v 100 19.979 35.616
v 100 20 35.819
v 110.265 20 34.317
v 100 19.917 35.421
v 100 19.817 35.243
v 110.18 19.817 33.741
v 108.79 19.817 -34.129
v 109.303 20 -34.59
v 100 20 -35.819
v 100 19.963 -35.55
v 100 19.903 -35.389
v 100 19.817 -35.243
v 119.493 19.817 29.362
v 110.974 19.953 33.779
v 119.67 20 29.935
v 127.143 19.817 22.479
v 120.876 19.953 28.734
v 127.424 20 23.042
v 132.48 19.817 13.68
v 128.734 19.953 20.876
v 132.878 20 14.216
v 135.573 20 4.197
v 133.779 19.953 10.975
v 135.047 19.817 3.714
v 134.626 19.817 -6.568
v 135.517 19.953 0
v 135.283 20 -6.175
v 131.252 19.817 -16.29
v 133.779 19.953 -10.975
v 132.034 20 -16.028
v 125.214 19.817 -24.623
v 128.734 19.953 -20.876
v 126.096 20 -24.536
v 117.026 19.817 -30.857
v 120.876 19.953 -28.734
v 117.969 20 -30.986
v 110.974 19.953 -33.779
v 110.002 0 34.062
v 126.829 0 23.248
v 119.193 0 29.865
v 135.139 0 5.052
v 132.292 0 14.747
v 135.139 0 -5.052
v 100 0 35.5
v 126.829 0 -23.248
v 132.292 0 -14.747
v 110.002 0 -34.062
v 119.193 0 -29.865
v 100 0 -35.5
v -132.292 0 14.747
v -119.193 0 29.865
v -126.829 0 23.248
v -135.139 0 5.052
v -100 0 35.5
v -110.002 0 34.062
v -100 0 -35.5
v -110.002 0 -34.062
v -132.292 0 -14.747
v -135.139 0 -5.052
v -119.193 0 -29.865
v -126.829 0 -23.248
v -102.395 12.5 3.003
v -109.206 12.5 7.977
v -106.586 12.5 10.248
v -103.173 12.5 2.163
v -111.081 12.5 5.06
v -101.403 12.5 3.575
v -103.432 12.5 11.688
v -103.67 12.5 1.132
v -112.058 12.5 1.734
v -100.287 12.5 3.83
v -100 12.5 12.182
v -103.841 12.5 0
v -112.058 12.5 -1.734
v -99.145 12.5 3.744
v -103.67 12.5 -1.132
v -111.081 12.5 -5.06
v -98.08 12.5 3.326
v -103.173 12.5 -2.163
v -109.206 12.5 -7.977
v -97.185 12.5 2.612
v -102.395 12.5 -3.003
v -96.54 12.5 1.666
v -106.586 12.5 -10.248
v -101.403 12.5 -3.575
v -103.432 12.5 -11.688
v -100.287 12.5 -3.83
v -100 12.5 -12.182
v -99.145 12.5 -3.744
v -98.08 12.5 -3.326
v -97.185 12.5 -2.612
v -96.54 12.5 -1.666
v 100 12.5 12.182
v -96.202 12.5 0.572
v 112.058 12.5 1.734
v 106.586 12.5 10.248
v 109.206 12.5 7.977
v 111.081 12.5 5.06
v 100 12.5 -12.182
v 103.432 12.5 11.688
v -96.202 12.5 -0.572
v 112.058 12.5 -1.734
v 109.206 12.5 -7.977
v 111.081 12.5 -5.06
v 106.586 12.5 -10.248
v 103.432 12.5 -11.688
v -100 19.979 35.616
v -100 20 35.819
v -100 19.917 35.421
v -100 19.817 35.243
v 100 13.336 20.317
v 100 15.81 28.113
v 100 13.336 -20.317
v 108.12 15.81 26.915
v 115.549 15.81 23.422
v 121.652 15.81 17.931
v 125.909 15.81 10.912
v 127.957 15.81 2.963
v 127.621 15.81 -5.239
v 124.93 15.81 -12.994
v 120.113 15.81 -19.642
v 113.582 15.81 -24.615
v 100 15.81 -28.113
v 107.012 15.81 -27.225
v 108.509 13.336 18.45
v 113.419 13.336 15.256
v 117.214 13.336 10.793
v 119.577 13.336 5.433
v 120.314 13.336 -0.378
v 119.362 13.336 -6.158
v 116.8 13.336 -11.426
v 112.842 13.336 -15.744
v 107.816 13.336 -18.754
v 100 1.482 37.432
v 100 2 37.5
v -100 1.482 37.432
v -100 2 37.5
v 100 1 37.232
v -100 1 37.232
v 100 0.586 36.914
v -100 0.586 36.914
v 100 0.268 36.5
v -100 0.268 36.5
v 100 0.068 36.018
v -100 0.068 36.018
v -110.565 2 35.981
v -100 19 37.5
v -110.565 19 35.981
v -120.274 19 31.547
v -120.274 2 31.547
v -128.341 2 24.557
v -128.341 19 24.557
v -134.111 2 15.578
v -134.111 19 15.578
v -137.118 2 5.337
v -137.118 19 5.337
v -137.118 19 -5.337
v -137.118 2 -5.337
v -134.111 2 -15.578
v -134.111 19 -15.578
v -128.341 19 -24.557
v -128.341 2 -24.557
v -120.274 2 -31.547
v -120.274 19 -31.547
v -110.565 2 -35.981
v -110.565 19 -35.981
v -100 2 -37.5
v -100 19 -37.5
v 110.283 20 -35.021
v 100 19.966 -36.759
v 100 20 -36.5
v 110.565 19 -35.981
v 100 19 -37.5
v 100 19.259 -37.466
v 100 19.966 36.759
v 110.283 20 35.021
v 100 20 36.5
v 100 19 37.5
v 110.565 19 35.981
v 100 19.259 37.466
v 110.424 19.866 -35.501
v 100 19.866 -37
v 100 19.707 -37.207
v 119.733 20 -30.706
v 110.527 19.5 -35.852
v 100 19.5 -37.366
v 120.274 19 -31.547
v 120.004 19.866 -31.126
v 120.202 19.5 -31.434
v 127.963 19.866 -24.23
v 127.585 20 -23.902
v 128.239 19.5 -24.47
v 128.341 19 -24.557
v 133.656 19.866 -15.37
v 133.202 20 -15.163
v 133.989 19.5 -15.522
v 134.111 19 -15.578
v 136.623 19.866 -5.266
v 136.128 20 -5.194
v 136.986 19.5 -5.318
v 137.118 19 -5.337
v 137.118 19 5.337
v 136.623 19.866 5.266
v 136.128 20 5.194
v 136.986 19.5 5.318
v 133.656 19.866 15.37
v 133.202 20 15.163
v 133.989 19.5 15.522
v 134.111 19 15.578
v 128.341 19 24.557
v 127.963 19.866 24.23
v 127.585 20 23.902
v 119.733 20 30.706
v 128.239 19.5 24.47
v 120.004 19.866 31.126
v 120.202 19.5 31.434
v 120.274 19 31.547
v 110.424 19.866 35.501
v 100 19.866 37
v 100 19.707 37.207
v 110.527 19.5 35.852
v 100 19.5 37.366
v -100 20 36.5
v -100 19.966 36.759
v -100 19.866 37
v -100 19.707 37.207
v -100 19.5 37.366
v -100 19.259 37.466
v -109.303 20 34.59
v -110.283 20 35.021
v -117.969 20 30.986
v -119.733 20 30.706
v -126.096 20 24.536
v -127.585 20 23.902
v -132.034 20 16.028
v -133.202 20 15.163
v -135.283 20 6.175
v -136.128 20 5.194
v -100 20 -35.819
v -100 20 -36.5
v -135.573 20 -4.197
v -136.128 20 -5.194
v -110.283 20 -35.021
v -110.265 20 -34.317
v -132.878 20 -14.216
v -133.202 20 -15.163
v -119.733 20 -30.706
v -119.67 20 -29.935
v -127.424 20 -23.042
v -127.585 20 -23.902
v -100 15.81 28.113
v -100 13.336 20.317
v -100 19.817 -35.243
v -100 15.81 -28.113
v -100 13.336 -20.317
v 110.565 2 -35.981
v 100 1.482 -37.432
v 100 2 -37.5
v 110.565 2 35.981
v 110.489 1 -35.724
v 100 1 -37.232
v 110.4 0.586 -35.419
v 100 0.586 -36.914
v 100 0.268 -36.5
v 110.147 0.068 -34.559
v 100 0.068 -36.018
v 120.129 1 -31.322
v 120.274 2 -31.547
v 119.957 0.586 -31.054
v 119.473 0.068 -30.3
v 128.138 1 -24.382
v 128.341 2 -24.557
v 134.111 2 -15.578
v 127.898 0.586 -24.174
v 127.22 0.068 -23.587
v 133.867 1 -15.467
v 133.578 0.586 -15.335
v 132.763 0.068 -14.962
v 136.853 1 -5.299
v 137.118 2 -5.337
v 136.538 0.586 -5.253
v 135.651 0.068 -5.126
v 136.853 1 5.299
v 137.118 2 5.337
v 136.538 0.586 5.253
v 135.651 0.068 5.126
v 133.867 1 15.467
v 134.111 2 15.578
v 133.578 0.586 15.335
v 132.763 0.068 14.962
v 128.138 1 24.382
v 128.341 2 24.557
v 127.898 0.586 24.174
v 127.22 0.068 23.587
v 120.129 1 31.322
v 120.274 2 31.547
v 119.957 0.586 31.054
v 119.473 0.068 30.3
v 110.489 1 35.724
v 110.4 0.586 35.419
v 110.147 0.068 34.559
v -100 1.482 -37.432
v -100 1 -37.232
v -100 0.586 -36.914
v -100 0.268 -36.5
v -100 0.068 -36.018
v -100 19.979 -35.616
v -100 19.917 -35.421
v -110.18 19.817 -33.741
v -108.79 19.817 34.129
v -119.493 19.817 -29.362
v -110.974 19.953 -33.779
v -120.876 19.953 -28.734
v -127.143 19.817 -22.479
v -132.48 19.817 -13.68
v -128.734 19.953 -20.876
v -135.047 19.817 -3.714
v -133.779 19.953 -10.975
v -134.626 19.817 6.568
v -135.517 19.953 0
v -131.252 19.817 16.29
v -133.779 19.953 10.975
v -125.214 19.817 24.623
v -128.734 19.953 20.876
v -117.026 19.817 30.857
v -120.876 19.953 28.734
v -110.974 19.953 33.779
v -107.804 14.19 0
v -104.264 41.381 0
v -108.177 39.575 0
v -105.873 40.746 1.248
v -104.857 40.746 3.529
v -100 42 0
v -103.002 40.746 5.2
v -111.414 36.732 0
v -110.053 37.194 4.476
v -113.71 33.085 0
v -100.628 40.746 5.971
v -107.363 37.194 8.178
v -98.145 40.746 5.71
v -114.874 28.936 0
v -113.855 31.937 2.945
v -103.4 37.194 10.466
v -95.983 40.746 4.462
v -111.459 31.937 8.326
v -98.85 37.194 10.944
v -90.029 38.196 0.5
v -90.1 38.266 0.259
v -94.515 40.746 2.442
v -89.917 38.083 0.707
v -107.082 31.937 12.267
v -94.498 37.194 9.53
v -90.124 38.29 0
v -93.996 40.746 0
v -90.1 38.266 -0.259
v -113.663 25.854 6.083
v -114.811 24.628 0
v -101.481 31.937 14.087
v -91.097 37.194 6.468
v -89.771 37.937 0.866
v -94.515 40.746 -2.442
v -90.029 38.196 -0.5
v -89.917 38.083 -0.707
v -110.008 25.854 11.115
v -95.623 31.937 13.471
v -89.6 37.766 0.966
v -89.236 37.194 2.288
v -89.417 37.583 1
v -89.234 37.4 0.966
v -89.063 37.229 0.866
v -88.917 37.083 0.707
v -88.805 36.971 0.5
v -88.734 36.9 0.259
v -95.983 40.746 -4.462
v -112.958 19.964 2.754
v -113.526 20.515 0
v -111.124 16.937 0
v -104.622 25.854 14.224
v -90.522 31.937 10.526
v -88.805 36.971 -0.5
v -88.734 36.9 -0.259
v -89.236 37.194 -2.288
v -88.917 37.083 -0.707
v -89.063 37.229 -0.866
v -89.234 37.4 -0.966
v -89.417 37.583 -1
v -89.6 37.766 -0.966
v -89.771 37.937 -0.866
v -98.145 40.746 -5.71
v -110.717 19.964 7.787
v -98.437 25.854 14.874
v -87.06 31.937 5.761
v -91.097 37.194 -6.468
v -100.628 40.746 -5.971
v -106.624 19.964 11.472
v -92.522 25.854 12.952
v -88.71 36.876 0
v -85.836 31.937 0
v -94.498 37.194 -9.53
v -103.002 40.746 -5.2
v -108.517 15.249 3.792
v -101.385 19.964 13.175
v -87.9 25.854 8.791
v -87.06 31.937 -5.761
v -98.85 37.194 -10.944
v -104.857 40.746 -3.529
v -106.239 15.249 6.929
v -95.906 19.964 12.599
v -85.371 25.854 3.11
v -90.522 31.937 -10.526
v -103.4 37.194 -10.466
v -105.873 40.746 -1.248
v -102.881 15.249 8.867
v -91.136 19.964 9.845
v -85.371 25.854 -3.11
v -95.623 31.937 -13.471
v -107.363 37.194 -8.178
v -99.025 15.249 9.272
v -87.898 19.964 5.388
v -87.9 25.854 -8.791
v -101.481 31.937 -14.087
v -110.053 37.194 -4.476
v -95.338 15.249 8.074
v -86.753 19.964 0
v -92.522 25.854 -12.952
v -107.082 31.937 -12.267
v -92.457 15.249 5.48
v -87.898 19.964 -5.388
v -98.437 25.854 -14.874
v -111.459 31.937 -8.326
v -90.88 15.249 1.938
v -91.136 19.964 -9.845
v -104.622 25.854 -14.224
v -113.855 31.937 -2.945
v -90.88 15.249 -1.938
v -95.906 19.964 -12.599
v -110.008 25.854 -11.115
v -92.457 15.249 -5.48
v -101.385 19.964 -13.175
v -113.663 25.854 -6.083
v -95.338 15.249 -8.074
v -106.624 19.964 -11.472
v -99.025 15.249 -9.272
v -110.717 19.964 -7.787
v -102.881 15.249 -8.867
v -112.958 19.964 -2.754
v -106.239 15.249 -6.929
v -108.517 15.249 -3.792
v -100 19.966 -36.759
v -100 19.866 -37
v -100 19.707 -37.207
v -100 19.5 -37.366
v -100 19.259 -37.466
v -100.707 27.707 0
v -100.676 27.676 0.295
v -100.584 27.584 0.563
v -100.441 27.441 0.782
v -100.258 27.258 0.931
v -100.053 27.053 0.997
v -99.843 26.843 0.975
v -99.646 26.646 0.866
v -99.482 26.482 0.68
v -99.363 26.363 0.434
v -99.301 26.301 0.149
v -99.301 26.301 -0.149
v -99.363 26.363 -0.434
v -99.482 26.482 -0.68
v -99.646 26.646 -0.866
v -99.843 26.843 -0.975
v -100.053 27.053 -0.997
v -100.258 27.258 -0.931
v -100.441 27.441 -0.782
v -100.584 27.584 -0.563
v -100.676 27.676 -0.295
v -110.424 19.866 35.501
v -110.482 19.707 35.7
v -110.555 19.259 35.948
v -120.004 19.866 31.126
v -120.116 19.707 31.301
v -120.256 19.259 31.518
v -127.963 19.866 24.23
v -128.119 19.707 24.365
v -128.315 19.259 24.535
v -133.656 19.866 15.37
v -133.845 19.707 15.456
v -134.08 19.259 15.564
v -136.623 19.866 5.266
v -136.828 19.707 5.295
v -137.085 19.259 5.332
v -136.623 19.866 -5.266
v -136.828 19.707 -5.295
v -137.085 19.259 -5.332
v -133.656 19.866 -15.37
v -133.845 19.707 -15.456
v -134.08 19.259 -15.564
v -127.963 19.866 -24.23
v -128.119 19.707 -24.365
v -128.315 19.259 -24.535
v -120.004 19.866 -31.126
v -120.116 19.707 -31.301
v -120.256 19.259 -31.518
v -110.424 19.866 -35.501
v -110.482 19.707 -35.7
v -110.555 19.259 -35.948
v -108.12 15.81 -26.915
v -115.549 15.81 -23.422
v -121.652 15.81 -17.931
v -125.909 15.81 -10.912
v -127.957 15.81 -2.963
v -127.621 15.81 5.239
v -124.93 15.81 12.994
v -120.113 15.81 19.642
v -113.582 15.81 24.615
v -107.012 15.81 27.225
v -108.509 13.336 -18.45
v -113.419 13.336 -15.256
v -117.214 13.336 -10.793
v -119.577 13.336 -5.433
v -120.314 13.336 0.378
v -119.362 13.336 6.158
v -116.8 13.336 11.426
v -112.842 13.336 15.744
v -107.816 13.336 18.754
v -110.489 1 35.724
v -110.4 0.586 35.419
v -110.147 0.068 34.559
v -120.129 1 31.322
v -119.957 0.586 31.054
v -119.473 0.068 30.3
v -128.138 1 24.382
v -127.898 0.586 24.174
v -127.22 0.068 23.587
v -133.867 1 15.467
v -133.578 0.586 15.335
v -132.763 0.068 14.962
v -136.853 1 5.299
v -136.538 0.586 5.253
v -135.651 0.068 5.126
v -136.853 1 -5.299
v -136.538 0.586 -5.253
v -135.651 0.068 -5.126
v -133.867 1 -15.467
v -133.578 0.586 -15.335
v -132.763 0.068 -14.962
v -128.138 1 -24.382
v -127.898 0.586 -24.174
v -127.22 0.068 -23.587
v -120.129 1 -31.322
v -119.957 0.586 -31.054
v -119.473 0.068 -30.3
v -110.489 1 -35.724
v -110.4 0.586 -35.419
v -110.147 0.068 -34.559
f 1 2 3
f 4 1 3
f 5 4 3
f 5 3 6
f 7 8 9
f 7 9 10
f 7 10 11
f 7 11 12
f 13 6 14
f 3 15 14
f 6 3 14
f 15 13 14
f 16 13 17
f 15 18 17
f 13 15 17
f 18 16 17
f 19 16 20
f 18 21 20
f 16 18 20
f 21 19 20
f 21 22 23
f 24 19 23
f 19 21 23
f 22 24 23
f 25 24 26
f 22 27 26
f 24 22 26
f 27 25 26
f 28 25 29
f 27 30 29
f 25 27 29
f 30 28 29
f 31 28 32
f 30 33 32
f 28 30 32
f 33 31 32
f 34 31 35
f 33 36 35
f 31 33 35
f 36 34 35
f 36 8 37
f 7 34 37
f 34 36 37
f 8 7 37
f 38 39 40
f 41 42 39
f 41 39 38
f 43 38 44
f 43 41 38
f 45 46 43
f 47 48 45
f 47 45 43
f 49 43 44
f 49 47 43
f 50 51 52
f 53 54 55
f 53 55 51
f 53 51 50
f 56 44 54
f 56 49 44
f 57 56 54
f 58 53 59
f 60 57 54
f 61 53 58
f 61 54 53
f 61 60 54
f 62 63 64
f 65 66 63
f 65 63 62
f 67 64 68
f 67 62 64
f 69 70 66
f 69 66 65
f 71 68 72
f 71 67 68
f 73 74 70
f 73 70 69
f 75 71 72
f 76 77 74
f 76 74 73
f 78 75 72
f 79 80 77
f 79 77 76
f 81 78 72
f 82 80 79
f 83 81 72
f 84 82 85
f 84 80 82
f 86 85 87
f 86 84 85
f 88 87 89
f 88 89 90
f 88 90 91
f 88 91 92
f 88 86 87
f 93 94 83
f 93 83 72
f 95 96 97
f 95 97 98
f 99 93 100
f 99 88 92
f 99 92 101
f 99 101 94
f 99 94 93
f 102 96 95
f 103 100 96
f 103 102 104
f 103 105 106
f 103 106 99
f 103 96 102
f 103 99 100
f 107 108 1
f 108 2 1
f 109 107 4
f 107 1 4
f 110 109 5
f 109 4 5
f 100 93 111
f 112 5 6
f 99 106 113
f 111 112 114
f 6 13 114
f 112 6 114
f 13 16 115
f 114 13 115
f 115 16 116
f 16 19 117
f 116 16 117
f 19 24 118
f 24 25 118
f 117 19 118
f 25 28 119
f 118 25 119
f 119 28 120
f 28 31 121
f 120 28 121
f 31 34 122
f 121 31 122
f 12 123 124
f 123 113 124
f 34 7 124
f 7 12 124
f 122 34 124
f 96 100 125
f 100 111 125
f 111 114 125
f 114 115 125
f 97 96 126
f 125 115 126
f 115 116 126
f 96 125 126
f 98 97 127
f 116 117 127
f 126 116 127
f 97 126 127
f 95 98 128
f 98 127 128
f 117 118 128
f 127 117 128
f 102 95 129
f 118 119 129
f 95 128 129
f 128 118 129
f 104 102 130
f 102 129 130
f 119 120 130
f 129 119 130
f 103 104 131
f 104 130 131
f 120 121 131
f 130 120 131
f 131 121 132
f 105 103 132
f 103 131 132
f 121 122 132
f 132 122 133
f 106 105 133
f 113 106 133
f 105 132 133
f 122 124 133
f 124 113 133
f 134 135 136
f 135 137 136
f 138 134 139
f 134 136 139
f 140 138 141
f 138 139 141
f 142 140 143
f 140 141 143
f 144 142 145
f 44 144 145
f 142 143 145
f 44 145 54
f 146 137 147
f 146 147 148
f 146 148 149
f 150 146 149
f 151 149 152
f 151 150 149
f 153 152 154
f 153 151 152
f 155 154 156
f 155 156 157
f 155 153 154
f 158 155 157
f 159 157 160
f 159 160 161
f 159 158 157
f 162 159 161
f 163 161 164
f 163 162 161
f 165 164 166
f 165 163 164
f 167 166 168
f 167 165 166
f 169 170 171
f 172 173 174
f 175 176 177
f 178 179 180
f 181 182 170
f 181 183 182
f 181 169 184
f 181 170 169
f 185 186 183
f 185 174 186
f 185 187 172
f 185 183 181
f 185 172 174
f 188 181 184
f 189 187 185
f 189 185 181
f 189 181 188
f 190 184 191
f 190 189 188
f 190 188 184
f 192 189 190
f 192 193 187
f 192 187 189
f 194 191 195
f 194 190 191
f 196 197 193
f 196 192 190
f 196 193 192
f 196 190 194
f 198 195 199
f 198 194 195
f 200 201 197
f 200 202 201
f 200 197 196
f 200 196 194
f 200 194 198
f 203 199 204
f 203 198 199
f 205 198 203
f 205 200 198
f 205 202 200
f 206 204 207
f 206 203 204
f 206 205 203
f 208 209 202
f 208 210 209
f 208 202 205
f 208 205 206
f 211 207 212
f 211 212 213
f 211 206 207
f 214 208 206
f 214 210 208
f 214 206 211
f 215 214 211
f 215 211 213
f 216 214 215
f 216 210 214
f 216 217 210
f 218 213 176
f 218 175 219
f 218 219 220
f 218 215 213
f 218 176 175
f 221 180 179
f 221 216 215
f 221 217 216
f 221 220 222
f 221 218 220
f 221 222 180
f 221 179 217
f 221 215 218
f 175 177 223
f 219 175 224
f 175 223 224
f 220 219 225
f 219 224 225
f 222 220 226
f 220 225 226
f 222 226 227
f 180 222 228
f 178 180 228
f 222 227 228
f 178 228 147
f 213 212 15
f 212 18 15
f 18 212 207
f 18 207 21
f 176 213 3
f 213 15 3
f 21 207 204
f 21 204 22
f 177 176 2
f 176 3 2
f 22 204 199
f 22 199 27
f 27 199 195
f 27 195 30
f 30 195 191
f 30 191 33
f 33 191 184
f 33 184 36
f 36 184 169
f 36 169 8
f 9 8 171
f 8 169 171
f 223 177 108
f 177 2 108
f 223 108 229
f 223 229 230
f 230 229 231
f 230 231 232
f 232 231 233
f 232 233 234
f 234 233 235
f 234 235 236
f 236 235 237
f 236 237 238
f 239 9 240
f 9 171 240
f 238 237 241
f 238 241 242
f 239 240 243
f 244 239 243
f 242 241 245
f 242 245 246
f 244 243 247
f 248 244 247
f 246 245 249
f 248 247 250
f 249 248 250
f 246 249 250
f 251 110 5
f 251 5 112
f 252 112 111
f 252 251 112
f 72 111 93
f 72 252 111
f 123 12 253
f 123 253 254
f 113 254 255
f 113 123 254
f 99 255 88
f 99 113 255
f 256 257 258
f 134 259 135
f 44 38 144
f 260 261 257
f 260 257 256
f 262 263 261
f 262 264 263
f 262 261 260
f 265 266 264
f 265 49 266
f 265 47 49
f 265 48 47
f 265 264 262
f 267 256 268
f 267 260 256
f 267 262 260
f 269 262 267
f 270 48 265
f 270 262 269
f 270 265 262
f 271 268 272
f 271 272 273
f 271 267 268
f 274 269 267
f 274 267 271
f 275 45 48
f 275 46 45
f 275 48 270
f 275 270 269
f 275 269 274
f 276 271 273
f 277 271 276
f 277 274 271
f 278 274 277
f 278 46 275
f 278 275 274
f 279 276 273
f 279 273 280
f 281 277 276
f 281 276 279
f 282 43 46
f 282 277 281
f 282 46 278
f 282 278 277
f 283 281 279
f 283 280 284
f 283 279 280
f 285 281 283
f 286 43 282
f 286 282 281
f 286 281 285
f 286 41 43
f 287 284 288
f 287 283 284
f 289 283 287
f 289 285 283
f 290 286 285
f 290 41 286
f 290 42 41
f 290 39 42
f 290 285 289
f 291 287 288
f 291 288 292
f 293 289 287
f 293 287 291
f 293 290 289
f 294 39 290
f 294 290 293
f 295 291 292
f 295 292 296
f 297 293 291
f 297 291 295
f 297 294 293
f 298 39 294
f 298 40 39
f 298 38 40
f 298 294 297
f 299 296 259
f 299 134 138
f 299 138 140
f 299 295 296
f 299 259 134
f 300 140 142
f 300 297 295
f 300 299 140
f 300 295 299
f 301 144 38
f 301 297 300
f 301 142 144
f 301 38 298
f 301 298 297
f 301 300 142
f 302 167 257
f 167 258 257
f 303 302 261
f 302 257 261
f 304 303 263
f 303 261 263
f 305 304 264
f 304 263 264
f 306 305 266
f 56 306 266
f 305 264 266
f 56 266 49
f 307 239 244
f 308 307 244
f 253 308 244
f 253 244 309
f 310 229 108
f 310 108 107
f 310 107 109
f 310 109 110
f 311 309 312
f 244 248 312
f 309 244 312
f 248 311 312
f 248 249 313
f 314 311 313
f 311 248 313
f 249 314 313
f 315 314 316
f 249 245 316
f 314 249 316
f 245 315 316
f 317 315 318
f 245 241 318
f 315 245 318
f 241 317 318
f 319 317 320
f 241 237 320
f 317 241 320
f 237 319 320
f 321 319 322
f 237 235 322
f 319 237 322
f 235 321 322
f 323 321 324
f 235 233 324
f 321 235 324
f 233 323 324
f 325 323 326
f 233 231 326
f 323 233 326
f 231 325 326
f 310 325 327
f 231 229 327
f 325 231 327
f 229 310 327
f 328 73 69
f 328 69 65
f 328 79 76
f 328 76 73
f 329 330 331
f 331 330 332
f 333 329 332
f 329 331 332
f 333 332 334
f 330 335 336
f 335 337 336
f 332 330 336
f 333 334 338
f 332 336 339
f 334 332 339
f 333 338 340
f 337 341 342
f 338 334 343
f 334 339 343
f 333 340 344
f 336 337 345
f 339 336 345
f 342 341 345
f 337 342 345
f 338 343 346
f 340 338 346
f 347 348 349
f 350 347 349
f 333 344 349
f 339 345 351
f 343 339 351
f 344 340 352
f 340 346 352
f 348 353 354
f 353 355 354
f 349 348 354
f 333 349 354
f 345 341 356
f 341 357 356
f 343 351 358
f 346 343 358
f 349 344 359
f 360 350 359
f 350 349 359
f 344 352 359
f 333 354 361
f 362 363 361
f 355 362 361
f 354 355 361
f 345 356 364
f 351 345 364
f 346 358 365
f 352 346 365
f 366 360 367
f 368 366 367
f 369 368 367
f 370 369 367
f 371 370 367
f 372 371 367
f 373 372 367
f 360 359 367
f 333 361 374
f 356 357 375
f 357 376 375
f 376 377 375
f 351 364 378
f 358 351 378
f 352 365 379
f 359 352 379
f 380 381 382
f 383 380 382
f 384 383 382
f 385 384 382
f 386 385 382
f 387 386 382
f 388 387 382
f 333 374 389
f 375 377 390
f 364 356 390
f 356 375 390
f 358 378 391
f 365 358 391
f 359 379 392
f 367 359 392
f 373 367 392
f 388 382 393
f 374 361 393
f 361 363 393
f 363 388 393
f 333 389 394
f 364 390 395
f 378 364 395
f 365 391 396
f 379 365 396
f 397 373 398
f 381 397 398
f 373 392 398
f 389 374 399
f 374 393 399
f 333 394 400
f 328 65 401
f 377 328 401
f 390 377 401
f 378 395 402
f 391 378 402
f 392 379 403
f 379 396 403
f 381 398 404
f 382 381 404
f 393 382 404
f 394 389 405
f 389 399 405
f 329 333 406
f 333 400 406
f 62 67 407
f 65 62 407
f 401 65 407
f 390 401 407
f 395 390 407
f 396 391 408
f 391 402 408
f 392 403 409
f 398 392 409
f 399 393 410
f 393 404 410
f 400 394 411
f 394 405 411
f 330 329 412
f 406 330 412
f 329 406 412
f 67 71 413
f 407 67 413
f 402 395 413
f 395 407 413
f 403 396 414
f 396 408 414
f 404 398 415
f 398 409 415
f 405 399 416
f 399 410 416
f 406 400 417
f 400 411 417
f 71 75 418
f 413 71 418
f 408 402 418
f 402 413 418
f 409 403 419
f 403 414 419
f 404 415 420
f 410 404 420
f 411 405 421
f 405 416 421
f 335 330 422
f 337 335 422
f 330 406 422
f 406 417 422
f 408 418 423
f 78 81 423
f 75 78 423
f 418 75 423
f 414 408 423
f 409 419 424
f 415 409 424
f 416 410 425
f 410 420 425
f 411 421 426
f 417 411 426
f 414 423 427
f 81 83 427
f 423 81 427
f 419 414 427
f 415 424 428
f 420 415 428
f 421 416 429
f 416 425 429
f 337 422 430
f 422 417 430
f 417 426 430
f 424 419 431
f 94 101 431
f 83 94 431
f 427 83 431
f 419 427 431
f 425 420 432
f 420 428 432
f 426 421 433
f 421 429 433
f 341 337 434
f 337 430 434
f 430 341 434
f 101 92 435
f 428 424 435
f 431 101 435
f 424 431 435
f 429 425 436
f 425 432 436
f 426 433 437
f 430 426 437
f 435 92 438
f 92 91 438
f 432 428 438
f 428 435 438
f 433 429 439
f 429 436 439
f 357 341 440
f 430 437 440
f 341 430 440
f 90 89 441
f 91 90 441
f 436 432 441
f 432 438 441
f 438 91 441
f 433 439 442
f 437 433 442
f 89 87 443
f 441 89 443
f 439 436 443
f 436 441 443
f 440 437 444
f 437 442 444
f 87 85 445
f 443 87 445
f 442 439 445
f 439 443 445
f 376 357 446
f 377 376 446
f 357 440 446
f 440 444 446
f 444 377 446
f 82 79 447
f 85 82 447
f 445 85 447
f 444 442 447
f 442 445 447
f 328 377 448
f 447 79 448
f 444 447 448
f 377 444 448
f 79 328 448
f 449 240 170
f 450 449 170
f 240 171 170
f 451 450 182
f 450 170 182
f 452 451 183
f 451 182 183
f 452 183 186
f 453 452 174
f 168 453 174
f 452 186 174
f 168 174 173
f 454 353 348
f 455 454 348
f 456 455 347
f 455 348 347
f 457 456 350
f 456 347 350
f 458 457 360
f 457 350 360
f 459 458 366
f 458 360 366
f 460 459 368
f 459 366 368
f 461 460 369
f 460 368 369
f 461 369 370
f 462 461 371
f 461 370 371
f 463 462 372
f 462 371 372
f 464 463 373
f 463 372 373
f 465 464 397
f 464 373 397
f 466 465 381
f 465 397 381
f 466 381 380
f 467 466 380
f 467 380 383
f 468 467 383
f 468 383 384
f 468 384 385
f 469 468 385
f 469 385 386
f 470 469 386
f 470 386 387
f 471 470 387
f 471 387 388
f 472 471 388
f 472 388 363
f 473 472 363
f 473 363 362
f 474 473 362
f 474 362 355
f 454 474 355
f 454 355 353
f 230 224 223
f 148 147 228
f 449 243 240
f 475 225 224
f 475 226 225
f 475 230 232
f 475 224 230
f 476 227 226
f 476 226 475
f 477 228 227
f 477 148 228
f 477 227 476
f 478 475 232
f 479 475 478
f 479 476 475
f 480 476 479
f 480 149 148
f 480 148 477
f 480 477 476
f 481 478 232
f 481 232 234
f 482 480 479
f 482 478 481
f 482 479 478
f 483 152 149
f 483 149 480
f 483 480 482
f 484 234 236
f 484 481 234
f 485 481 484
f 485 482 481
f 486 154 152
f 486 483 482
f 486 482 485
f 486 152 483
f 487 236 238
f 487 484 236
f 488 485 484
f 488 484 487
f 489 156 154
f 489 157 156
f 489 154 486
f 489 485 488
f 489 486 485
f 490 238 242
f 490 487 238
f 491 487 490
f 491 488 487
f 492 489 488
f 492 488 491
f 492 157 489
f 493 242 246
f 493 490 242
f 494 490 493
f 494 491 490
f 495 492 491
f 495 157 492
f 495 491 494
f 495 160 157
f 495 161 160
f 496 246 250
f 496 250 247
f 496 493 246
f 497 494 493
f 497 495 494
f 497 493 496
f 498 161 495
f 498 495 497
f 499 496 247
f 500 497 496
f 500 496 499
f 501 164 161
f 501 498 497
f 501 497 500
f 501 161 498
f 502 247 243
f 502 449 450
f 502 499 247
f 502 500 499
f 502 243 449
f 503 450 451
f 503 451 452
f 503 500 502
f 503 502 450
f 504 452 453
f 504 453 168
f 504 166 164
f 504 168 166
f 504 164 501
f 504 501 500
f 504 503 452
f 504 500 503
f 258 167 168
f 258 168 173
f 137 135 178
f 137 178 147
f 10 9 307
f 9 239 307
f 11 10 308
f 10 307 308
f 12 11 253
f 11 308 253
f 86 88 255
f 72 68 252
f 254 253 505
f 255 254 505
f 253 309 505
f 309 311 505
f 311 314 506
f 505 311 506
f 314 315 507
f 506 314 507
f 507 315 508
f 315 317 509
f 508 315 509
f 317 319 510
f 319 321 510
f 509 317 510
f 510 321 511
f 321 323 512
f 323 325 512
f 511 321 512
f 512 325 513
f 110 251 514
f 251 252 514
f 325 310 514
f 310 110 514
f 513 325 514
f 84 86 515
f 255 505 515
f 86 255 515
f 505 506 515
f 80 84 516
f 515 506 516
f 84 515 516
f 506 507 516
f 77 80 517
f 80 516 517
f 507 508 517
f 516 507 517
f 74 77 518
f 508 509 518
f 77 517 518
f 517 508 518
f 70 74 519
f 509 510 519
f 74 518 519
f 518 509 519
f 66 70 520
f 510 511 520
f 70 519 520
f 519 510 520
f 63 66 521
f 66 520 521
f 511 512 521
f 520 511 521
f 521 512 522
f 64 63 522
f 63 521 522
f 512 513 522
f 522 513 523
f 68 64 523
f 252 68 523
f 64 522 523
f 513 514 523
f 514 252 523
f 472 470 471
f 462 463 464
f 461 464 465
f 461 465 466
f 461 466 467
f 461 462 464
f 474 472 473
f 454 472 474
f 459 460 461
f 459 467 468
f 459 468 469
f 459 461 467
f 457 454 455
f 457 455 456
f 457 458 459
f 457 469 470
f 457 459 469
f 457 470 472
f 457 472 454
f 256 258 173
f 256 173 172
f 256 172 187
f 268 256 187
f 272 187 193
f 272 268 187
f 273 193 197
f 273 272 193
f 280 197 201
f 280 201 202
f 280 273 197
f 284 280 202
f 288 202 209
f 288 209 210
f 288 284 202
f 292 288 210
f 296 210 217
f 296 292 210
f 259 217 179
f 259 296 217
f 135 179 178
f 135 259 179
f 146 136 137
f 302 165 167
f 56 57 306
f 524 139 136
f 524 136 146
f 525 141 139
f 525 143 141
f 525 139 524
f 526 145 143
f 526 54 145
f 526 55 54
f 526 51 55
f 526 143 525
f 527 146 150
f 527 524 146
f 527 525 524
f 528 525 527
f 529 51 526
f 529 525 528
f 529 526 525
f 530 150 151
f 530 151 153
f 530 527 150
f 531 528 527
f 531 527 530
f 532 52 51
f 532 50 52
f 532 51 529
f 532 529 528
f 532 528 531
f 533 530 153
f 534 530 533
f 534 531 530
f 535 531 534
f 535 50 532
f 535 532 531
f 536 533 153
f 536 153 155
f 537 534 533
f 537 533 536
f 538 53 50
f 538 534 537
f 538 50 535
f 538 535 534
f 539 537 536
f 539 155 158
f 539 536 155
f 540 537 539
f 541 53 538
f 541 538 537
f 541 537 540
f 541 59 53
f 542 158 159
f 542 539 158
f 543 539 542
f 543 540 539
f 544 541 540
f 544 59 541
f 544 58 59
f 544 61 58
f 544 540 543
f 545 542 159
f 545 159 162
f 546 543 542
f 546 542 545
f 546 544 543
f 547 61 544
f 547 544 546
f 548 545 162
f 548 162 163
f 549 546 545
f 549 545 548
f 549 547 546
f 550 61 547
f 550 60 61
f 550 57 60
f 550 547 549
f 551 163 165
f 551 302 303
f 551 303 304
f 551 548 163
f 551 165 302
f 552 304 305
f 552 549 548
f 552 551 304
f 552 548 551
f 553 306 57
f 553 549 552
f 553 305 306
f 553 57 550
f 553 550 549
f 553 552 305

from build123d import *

# Parameters (mm, degrees)
BOSS_EXTRUDE1_DEPTH = 20
CUT_EXTRUDE1_DEPTH  = 7.5
FILLET1_R           = 40
FILLET2_R           = 1
FILLET3_R           = 2
SKETCH6_R           = 1
CUT_EXTRUDE2_DEPTH  = 15


with BuildPart() as part:
    # Sketch1 → Boss-Extrude1 (new body)
    with BuildSketch(Plane(origin=(0, 0, 0), x_dir=(1, 0, 0), z_dir=(0, 1, 0))):
        with BuildLine():
            Line((-100, 37.5), (100, 37.5))
            ThreePointArc((100, 37.5), (137.5, 0), (100, -37.5))
            Line((100, -37.5), (-100, -37.5))
            ThreePointArc((-100, -37.5), (-137.5, 0), (-100, 37.5))
        make_face()
    extrude(amount=BOSS_EXTRUDE1_DEPTH)

    # Sketch2 → Cut-Extrude1 (cut)
    with BuildSketch(Plane(origin=(0, 20, 0), x_dir=(1, 0, 0), z_dir=(0, 1, 0))):
        with BuildLine():
            Line((-100, -35.5), (100, -35.5))
            ThreePointArc((100, -35.5), (135.5, 0), (100, 35.5))
            Line((100, 35.5), (-100, 35.5))
            ThreePointArc((-100, 35.5), (-135.5, 0), (-100, -35.5))
        make_face()
    extrude(amount=-CUT_EXTRUDE1_DEPTH, mode=Mode.SUBTRACT)

    # Fillet1
    # the kernel refuses this fillet: 40 mm, written as the material it adds along each edge
    with BuildSketch(Plane(origin=(100, 12.5, -35.5), x_dir=(0, 1, 0), z_dir=(-1, 0, 0)), Plane(origin=(-100, 12.5, 35.5), x_dir=(0, 1, 0), z_dir=(1, 0, 0))) as fillet1_piece_1:
        with BuildLine():
            CenterArc((40, -23.318447633), FILLET1_R, 144.340912304, 35.659087696)
            Line((0, -23.318447633), (-0.8, -23.318447633))
            Line((-0.8, -23.318447633), (-0.8, 0))
            Line((-0.8, 0), (0, 0.8))
            ThreePointArc((0, 0.8), (3.75, 0.8), (6.85, 0.466368953))
            Line((6.85, 0.466368953), (7.5, 0))
        make_face()
    extrude(amount=200)
    with BuildSketch(Plane(origin=(-100, 12.5, 0), x_dir=(0, 0, -1), z_dir=(1, 0, 0))) as fillet1_piece_2:
        with BuildLine():
            CenterArc((12.181552367, 40), FILLET1_R, 270, 35.659087696)
            Line((12.181552367, 0), (12.181552367, -0.8))
            Line((12.181552367, -0.8), (35.5, -0.8))
            Line((35.5, -0.8), (36.3, 0))
            ThreePointArc((36.3, 0), (36.3, 3.75), (35.966368953, 6.85))
            Line((35.966368953, 6.85), (35.5, 7.5))
        make_face()
    revolve(axis=Axis((-100, 12.5, 0), (0, 1, 0)), revolution_arc=180)
    with BuildSketch(Plane(origin=(100, 12.5, 0), x_dir=(0, 0, 1), z_dir=(-1, 0, 0))) as fillet1_piece_3:
        with BuildLine():
            CenterArc((12.181552367, 40), FILLET1_R, 270, 35.659087696)
            Line((12.181552367, 0), (12.181552367, -0.8))
            Line((12.181552367, -0.8), (35.5, -0.8))
            Line((35.5, -0.8), (36.3, 0))
            ThreePointArc((36.3, 0), (36.3, 3.75), (35.966368953, 6.85))
            Line((35.966368953, 6.85), (35.5, 7.5))
        make_face()
    revolve(axis=Axis((100, 12.5, 0), (0, 1, 0)), revolution_arc=180)

    # Fillet2
    fillet2_edges = [part.edges().sort_by_distance(p)[0] for p in [
        (137.5, 20, 0),
        (0, 20, -37.5),
        (-135.5, 20, 0),
        (0, 20, 35.5),
        (135.5, 20, 0),
        (0, 20, -35.5),
        (-137.5, 20, 0),
        (0, 20, 37.5),
    ]]
    fillet(fillet2_edges, radius=FILLET2_R)

    # Fillet3
    fillet3_edges = [part.edges().sort_by_distance(p)[0] for p in [
        (0, 0, -37.5),
        (137.5, 0, 0),
        (0, 0, 37.5),
        (-137.5, 0, 0),
    ]]
    fillet(fillet3_edges, radius=FILLET3_R)

    # Sketch4 → Revolve1 (revolve)
    with BuildSketch(Plane.XY):
        with BuildLine():
            Line((-100, 12), (-100, 42))
            ThreePointArc((-100, 42), (-115, 27), (-100, 12))
        make_face()
    revolve(axis=Axis((-100, 12, 0), (0, 1, 0)))

    # Sketch6 → Cut-Extrude2 (cut)
    with BuildSketch(Plane(origin=(-25.893398282, -25.893398282, 0), x_dir=(0.7071067811865488, -0.7071067811865464, 0), z_dir=(0.7071067811865464, 0.7071067811865488, 0))):
        with Locations(Location((-89.802561211, 0, 0), (0, 0, 180))):
            Circle(SKETCH6_R)
    extrude(amount=-CUT_EXTRUDE2_DEPTH, mode=Mode.SUBTRACT)


solid = part.part
